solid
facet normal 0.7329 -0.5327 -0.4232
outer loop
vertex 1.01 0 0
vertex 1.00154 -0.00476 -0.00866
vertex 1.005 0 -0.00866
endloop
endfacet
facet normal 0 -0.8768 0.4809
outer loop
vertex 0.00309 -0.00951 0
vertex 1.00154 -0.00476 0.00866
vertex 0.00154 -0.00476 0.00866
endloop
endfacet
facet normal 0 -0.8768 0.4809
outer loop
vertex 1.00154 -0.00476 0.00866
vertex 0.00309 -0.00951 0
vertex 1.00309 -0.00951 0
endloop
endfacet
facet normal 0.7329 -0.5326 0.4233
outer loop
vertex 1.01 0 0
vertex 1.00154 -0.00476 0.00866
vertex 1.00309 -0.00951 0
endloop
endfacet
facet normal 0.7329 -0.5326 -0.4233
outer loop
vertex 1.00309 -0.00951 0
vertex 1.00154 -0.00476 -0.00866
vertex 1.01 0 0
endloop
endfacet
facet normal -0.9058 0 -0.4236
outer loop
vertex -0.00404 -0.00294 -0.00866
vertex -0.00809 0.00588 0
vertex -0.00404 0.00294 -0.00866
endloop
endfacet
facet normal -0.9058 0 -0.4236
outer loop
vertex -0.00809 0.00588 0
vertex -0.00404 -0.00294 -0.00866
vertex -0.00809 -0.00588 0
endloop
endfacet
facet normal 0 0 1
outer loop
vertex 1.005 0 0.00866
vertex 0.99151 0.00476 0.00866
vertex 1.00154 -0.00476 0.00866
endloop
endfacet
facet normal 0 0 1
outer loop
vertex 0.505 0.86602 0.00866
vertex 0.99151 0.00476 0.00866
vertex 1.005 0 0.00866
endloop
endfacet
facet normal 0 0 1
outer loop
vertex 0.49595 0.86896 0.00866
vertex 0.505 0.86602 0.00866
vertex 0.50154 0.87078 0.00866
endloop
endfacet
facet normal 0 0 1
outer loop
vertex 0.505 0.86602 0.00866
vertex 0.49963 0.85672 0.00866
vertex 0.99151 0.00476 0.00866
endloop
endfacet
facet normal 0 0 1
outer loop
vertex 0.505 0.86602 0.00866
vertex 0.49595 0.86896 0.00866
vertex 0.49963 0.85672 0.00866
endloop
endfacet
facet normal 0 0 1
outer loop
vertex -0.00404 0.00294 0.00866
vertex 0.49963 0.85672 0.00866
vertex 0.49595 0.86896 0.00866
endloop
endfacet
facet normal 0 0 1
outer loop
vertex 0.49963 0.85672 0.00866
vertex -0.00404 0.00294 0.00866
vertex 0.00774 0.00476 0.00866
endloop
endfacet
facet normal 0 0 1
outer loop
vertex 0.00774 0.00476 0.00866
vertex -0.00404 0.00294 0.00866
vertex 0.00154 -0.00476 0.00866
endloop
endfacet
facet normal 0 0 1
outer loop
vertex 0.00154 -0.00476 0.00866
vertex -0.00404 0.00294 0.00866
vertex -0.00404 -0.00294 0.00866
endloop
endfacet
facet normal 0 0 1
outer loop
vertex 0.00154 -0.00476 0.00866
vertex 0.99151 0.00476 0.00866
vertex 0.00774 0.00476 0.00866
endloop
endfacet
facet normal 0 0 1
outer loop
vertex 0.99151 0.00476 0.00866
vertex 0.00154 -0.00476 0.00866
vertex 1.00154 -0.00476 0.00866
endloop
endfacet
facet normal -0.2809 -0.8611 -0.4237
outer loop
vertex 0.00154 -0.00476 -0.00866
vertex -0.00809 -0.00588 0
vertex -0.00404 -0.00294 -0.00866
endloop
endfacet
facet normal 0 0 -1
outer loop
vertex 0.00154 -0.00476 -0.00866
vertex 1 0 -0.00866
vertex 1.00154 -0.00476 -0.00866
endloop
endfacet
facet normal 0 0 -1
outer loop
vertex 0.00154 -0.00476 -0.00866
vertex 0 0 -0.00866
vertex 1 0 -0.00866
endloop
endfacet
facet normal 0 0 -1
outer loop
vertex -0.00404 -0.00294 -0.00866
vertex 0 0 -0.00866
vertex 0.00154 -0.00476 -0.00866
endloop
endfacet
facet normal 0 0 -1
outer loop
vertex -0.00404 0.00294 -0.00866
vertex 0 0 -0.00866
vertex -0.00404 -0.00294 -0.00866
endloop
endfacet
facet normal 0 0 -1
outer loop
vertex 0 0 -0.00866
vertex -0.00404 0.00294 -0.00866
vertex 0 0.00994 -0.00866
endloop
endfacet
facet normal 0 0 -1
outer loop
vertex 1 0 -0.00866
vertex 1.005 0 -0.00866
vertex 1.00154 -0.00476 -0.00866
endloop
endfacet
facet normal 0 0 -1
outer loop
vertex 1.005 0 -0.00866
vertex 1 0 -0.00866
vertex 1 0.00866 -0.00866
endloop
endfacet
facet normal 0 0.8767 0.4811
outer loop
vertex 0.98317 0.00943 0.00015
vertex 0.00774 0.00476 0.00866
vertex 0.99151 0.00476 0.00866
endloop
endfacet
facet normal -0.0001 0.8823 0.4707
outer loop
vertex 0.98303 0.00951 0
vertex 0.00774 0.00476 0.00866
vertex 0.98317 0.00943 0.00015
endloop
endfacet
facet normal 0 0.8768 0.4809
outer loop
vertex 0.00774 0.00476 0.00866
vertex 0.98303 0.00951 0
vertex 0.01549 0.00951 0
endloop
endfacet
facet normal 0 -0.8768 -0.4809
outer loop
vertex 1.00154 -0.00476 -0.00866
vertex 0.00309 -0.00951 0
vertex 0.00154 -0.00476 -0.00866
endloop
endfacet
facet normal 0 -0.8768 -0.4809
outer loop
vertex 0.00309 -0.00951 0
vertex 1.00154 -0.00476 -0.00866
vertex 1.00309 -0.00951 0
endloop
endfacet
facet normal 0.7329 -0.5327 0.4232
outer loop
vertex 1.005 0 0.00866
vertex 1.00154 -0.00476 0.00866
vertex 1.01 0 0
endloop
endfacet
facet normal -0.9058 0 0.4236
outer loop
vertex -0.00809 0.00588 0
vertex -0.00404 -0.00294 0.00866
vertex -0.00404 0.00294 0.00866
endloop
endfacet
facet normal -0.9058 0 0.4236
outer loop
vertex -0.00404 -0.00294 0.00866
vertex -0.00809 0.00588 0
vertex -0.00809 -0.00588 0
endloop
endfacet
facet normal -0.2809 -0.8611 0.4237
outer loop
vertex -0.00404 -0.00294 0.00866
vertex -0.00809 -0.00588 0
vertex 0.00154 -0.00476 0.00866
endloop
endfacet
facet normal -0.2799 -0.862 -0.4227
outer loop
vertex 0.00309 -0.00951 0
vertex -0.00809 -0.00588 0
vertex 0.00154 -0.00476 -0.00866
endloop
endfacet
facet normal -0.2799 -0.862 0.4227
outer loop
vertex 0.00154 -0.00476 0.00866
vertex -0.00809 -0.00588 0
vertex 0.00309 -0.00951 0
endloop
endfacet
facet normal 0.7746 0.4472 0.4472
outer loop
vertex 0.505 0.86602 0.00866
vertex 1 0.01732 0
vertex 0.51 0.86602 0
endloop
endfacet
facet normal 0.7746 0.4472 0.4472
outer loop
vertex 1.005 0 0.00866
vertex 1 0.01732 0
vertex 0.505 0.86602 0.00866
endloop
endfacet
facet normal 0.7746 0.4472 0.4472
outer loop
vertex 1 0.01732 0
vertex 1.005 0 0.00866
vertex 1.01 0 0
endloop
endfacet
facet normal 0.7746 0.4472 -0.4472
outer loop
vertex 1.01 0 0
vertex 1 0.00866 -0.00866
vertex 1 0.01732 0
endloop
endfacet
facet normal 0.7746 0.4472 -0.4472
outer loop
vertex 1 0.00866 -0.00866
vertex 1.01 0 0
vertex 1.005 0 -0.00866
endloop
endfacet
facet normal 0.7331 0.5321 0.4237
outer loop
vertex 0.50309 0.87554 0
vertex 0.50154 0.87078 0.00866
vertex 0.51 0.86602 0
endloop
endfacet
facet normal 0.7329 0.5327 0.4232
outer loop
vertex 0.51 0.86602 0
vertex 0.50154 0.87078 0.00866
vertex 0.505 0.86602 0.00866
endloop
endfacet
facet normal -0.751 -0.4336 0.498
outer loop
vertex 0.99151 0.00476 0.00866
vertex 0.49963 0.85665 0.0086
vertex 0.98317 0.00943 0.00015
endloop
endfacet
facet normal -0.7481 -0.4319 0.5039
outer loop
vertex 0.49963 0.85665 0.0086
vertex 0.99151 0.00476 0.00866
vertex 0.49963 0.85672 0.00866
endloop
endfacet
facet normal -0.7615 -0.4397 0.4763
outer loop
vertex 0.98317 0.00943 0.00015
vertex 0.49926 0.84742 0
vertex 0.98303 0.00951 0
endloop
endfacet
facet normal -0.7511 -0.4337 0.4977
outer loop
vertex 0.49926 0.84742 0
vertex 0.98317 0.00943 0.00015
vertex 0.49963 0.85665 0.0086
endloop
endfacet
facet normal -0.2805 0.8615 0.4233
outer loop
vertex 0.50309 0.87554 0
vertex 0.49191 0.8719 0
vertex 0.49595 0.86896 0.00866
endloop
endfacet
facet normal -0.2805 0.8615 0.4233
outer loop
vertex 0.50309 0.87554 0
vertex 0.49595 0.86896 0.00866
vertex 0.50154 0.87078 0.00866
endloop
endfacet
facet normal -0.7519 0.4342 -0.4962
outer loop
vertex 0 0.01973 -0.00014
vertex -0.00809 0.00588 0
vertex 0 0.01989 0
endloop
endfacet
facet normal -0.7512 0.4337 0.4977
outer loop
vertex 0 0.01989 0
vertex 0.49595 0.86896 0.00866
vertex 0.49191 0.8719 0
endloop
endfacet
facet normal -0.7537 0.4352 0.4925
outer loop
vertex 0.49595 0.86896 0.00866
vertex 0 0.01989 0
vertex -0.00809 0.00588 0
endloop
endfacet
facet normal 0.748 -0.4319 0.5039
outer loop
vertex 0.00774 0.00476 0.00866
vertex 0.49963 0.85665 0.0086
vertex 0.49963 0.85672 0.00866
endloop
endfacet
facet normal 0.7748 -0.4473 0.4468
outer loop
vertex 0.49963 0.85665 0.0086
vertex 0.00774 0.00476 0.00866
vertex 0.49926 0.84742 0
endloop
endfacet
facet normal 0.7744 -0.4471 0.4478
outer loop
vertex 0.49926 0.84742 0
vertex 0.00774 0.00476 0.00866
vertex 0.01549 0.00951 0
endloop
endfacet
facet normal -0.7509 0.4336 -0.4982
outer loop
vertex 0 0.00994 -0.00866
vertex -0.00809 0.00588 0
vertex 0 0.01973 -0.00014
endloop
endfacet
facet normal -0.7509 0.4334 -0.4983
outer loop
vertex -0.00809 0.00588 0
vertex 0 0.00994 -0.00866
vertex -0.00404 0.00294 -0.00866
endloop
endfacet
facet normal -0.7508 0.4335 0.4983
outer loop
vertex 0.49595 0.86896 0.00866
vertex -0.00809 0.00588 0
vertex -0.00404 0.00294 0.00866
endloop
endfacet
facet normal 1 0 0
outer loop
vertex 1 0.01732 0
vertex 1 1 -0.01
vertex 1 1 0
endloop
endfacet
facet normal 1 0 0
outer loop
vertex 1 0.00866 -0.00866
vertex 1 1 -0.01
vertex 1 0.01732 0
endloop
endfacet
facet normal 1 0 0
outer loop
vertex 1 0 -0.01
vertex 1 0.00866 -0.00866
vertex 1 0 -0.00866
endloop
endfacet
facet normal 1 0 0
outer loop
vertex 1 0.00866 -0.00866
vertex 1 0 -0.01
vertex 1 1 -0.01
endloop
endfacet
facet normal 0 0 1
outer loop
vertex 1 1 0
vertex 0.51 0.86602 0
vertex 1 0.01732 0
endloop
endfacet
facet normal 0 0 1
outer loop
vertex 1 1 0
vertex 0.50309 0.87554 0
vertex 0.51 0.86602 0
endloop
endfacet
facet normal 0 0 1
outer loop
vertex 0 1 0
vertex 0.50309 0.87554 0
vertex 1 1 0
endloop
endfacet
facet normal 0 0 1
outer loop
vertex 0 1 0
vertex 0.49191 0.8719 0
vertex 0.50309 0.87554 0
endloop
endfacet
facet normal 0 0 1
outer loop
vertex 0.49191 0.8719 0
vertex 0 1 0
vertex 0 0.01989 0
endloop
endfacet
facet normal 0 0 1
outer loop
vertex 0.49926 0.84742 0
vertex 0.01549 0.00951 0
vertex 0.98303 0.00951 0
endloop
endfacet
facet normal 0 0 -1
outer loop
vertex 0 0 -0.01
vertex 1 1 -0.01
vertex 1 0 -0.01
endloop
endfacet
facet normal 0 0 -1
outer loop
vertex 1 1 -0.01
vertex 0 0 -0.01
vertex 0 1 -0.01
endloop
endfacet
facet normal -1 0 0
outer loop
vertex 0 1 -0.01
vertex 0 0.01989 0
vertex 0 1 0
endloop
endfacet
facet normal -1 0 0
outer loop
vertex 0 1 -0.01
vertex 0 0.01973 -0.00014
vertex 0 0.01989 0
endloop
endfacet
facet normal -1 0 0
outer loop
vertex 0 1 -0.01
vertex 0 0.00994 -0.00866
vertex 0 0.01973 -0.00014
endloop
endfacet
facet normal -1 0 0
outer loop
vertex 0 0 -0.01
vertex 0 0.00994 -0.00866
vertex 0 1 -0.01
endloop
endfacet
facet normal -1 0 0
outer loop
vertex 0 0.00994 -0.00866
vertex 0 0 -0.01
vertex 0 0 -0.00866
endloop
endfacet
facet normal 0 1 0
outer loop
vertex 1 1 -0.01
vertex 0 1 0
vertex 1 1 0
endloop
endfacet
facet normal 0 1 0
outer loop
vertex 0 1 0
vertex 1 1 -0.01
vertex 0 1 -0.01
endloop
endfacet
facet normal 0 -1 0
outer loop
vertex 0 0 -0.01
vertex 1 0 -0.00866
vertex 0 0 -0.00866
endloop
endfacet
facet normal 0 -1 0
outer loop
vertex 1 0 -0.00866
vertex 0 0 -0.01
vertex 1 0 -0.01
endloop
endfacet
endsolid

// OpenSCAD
hull(){
    translate([0.0, 0.0]) sphere(0.01);
    translate([1.0, 0.0]) sphere(0.01);
}
hull(){
    translate([1.0, 0.0]) sphere(0.01);
    translate([0.5, 0.86602540378]) sphere(0.01);
}
hull(){
    translate([0.5, 0.86602540378]) sphere(0.01);
    translate([0.0, 0.0]) sphere(0.01);
}
translate([0,0,-0.01]) color([0.1,0.1,0.1]) cube([1,1,0.01]);
